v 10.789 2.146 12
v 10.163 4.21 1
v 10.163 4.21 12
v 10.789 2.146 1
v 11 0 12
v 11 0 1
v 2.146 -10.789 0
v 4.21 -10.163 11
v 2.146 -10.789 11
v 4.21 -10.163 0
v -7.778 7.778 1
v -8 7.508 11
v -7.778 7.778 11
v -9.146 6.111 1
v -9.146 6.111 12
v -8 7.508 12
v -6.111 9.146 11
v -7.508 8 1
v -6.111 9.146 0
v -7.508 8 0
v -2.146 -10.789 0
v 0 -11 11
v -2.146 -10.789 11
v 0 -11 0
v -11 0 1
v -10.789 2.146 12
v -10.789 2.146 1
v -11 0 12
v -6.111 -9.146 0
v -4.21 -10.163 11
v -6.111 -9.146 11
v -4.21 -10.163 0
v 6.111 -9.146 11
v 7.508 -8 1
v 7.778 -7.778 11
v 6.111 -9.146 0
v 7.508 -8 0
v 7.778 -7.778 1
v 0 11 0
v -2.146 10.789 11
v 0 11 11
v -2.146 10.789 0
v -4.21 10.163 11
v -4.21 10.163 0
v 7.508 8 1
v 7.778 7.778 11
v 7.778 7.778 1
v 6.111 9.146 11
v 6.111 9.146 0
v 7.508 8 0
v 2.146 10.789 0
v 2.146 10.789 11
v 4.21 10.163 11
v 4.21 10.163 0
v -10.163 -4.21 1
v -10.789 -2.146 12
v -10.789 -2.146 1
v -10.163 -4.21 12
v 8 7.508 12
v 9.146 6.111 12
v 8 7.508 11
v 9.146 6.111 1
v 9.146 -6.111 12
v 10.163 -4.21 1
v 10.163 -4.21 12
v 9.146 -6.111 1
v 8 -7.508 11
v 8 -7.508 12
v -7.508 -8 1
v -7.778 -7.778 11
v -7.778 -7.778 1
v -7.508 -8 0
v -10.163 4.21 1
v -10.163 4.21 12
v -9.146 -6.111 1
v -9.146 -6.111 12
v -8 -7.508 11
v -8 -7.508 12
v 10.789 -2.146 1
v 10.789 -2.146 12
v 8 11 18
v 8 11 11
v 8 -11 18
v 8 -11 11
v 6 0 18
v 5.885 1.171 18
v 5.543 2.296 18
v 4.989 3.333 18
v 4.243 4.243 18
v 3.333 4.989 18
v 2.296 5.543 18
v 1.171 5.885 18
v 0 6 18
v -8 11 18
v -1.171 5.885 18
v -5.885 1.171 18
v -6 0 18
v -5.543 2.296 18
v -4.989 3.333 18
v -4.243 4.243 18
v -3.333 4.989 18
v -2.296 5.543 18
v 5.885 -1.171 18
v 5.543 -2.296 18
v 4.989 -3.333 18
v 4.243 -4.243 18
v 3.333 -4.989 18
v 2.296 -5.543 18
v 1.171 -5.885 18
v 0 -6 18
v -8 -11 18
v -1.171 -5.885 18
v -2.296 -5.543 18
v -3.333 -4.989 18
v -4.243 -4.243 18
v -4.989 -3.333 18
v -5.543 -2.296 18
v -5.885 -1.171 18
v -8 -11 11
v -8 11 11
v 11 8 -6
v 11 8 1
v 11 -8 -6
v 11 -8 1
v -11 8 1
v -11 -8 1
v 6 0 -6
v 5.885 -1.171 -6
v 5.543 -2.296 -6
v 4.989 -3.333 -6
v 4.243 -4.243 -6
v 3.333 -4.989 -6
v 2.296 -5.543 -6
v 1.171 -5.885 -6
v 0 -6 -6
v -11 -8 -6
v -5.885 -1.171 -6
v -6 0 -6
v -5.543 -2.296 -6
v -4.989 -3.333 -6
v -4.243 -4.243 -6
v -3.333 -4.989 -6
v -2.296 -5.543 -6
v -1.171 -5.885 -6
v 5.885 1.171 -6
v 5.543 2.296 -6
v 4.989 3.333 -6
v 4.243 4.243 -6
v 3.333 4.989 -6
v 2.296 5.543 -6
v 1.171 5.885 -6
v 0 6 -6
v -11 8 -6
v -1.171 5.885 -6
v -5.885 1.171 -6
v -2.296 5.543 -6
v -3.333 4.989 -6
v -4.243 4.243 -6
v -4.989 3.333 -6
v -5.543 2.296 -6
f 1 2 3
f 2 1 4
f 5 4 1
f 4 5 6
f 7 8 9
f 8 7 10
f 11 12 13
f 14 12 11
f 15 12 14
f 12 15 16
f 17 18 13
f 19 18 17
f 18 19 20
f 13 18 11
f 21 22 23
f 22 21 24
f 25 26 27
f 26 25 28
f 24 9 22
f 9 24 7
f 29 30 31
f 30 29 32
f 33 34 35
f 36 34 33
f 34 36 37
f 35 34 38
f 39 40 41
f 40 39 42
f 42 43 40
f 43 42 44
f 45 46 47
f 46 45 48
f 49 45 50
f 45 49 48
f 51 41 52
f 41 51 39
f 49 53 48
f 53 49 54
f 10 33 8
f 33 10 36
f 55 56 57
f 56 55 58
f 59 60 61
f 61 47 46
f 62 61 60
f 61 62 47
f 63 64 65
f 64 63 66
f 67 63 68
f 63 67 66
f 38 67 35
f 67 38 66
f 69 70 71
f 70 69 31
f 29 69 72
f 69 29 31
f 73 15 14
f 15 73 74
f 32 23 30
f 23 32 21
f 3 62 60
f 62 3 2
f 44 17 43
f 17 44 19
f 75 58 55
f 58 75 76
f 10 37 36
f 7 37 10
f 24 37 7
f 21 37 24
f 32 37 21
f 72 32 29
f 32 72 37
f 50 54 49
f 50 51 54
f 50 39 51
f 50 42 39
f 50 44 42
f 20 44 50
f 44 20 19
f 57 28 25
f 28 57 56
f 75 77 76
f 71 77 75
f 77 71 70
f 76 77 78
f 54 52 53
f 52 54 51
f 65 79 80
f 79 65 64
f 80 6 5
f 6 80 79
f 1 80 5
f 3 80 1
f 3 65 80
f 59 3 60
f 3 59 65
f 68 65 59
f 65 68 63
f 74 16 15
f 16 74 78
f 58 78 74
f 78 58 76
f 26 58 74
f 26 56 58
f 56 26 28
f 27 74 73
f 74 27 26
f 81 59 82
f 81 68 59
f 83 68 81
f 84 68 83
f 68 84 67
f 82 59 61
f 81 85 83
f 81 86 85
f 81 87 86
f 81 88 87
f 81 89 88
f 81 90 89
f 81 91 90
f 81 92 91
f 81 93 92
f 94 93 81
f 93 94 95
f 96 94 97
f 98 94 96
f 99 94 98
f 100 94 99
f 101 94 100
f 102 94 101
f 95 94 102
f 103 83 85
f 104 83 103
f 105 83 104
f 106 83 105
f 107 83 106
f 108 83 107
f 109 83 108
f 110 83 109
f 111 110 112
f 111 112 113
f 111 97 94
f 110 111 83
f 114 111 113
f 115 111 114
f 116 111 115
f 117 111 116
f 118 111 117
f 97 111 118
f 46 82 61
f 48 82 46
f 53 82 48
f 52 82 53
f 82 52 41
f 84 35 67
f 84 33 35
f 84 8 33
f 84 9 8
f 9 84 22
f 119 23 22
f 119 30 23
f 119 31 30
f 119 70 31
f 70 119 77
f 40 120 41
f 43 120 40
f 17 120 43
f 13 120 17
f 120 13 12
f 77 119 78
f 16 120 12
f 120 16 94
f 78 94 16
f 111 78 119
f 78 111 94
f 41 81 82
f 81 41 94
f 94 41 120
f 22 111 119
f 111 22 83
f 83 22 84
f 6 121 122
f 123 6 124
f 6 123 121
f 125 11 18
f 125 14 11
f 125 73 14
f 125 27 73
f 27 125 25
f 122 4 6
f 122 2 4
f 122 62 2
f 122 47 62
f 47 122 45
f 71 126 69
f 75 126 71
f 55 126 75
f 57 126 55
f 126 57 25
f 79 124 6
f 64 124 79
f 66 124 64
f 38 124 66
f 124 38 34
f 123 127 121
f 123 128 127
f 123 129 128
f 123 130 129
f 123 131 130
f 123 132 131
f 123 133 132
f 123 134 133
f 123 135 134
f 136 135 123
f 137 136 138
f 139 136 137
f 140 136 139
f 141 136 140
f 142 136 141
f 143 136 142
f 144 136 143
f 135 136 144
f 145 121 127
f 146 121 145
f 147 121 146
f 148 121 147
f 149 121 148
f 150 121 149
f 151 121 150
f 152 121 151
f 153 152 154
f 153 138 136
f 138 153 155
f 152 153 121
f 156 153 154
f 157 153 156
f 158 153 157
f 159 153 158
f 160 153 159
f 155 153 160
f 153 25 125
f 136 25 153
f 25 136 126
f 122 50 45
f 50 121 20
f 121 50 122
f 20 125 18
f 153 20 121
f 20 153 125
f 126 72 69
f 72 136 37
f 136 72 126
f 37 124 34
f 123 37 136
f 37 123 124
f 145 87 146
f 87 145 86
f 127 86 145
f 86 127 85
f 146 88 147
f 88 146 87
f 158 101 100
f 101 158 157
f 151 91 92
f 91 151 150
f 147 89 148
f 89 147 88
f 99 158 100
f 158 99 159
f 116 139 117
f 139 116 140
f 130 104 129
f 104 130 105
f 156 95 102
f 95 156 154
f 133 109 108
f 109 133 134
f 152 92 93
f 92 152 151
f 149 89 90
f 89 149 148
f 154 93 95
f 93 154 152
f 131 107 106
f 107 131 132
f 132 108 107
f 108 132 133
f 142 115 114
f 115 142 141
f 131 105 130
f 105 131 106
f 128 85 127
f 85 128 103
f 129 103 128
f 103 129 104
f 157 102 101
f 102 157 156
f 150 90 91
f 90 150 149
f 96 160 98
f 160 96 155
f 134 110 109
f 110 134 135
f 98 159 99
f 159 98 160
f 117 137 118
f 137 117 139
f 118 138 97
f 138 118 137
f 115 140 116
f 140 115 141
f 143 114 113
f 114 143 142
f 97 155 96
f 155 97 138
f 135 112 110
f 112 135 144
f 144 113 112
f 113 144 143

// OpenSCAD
$fn = 32;

// ----------------------------------------------------------------------
// Oldham coupling disc: 22 x 24 mm
// ----------------------------------------------------------------------

// --- parameters (mm) ---
disc_d = 22;              // disc diameter
disc_t = 12;              // disc thickness
tongue_w = 16;            // tongue width
tongue_h = 6;             // tongue height
bore_d = 12;              // centre lightening bore

module disc() {
  cylinder(h = disc_t, d = disc_d);
  /* tongue on the top face, sunk 1 mm into the disc */
  translate([-tongue_w / 2, -disc_d / 2, disc_t - 1]) cube([tongue_w, disc_d, tongue_h + 1]);
  /* slot wall on the bottom face, 90 degrees turned */
  translate([-disc_d / 2, -tongue_w / 2, -tongue_h]) cube([disc_d, tongue_w, tongue_h + 1]);
}

difference() {
  disc();
  translate([0, 0, -tongue_h - 1]) cylinder(h = disc_t + 2 * tongue_h + 2, d = bore_d);
}
